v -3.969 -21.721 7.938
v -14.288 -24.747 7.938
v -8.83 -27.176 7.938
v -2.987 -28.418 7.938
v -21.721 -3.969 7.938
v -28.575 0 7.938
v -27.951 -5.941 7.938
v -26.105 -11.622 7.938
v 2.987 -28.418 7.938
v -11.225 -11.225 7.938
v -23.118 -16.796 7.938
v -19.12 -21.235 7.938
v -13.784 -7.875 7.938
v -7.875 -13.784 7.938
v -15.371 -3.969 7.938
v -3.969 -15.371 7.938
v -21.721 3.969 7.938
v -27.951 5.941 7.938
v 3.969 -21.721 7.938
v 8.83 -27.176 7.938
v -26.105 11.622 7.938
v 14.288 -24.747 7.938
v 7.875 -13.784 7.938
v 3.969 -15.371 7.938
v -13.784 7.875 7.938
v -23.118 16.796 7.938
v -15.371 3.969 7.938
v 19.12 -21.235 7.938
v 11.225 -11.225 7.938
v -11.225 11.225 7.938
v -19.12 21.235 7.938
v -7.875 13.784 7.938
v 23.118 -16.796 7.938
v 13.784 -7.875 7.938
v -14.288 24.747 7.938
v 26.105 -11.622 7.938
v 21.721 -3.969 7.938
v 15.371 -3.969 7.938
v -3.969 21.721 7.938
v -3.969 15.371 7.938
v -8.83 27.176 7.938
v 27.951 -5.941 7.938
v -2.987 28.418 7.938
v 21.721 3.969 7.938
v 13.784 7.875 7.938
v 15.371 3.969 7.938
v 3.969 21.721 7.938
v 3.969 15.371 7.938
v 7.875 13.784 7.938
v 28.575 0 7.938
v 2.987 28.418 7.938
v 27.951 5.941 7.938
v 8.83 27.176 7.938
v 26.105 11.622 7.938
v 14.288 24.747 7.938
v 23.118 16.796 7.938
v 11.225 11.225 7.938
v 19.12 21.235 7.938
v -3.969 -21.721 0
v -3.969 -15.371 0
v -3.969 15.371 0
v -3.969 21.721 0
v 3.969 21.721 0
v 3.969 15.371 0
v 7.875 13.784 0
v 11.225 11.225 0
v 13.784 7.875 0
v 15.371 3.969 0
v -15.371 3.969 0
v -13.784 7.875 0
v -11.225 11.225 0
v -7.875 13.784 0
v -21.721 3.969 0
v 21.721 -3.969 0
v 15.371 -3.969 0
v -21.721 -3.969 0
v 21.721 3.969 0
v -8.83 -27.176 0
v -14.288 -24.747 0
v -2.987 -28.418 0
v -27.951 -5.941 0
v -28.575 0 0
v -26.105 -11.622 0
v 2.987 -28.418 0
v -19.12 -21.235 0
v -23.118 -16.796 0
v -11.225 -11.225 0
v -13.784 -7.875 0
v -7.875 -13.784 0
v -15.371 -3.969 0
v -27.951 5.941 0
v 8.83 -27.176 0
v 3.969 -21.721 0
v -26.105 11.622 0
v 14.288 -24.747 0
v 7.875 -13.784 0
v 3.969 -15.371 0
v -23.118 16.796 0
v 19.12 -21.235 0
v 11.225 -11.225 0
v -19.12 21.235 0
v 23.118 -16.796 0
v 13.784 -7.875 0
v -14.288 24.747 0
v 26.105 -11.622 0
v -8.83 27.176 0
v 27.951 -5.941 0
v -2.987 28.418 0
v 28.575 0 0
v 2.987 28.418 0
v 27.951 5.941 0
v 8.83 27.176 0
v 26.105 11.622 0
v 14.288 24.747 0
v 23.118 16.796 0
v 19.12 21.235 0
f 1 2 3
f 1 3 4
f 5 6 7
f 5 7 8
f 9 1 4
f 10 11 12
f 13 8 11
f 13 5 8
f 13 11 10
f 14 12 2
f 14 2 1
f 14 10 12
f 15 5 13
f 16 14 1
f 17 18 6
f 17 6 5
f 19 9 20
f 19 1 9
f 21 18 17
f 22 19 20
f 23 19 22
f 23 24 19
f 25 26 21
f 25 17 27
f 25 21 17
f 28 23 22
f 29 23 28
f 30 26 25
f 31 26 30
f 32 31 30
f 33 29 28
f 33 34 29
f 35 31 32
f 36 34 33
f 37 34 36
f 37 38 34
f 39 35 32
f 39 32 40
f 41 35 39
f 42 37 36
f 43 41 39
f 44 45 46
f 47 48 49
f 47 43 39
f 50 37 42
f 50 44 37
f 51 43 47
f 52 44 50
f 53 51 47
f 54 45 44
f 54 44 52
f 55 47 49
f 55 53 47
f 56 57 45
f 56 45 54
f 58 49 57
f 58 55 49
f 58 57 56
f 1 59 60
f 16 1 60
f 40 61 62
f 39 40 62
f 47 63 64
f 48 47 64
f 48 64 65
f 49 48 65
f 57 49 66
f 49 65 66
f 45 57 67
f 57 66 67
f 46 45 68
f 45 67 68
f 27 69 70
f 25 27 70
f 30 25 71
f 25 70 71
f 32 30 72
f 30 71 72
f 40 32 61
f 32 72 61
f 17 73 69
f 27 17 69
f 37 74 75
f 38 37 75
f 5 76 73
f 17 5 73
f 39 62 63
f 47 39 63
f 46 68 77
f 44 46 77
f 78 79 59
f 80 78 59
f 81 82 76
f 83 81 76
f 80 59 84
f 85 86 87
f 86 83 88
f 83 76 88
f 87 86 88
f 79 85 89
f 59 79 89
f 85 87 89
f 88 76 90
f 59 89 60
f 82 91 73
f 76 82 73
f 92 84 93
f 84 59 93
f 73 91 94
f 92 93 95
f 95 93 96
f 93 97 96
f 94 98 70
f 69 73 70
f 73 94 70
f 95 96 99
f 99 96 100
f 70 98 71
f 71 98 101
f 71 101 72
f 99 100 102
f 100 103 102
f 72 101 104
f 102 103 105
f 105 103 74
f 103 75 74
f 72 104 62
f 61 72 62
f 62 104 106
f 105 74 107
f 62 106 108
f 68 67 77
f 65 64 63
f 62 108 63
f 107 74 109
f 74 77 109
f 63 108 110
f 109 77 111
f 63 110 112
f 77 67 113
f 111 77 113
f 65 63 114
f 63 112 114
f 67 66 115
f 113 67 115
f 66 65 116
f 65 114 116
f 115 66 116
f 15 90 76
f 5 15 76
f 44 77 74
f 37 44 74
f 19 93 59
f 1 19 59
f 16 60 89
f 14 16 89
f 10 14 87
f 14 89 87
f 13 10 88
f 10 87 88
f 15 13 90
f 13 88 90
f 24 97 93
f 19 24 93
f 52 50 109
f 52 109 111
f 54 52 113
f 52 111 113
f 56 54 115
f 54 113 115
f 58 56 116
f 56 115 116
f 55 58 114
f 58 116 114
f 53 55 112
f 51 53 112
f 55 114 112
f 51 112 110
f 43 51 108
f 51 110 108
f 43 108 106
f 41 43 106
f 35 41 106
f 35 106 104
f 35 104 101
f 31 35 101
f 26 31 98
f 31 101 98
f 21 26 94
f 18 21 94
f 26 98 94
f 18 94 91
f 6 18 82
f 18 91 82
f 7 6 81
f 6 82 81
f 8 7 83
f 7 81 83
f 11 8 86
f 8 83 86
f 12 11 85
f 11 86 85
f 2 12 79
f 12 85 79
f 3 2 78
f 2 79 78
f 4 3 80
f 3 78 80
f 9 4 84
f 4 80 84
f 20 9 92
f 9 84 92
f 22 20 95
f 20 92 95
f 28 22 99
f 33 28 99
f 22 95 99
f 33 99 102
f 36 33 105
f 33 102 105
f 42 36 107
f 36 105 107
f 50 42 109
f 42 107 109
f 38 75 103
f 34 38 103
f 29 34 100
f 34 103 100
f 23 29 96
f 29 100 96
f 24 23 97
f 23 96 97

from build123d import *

# Parameters (mm, degrees)
F0_R     = 28.575
F1_DEPTH = 7.9375


with BuildPart() as f1:
    # F0 (on Top) → F1 (new body)
    with BuildSketch(Plane.XY):
        Circle(F0_R)
        with BuildLine():
            ThreePointArc((3.96875, 15.370903), (11.22532, 11.22532), (15.370903, 3.96875))
            Line((15.370903, 3.96875), (21.720903, 3.96875))
            Line((21.720903, 3.96875), (21.720903, -3.96875))
            Line((21.720903, -3.96875), (15.370903, -3.96875))
            ThreePointArc((15.370903, -3.96875), (11.22532, -11.22532), (3.96875, -15.370903))
            Line((3.96875, -15.370903), (3.96875, -21.720903))
            Line((3.96875, -21.720903), (-3.96875, -21.720903))
            Line((-3.96875, -21.720903), (-3.96875, -15.370903))
            ThreePointArc((-3.96875, -15.370903), (-11.22532, -11.22532), (-15.370903, -3.96875))
            Line((-15.370903, -3.96875), (-21.720903, -3.96875))
            Line((-21.720903, -3.96875), (-21.720903, 3.96875))
            Line((-21.720903, 3.96875), (-15.370903, 3.96875))
            ThreePointArc((-15.370903, 3.96875), (-11.22532, 11.22532), (-3.96875, 15.370903))
            Line((-3.96875, 15.370903), (-3.96875, 21.720903))
            Line((-3.96875, 21.720903), (3.96875, 21.720903))
            Line((3.96875, 21.720903), (3.96875, 15.370903))
        make_face(mode=Mode.SUBTRACT)
    extrude(amount=F1_DEPTH)


solid = f1.part
